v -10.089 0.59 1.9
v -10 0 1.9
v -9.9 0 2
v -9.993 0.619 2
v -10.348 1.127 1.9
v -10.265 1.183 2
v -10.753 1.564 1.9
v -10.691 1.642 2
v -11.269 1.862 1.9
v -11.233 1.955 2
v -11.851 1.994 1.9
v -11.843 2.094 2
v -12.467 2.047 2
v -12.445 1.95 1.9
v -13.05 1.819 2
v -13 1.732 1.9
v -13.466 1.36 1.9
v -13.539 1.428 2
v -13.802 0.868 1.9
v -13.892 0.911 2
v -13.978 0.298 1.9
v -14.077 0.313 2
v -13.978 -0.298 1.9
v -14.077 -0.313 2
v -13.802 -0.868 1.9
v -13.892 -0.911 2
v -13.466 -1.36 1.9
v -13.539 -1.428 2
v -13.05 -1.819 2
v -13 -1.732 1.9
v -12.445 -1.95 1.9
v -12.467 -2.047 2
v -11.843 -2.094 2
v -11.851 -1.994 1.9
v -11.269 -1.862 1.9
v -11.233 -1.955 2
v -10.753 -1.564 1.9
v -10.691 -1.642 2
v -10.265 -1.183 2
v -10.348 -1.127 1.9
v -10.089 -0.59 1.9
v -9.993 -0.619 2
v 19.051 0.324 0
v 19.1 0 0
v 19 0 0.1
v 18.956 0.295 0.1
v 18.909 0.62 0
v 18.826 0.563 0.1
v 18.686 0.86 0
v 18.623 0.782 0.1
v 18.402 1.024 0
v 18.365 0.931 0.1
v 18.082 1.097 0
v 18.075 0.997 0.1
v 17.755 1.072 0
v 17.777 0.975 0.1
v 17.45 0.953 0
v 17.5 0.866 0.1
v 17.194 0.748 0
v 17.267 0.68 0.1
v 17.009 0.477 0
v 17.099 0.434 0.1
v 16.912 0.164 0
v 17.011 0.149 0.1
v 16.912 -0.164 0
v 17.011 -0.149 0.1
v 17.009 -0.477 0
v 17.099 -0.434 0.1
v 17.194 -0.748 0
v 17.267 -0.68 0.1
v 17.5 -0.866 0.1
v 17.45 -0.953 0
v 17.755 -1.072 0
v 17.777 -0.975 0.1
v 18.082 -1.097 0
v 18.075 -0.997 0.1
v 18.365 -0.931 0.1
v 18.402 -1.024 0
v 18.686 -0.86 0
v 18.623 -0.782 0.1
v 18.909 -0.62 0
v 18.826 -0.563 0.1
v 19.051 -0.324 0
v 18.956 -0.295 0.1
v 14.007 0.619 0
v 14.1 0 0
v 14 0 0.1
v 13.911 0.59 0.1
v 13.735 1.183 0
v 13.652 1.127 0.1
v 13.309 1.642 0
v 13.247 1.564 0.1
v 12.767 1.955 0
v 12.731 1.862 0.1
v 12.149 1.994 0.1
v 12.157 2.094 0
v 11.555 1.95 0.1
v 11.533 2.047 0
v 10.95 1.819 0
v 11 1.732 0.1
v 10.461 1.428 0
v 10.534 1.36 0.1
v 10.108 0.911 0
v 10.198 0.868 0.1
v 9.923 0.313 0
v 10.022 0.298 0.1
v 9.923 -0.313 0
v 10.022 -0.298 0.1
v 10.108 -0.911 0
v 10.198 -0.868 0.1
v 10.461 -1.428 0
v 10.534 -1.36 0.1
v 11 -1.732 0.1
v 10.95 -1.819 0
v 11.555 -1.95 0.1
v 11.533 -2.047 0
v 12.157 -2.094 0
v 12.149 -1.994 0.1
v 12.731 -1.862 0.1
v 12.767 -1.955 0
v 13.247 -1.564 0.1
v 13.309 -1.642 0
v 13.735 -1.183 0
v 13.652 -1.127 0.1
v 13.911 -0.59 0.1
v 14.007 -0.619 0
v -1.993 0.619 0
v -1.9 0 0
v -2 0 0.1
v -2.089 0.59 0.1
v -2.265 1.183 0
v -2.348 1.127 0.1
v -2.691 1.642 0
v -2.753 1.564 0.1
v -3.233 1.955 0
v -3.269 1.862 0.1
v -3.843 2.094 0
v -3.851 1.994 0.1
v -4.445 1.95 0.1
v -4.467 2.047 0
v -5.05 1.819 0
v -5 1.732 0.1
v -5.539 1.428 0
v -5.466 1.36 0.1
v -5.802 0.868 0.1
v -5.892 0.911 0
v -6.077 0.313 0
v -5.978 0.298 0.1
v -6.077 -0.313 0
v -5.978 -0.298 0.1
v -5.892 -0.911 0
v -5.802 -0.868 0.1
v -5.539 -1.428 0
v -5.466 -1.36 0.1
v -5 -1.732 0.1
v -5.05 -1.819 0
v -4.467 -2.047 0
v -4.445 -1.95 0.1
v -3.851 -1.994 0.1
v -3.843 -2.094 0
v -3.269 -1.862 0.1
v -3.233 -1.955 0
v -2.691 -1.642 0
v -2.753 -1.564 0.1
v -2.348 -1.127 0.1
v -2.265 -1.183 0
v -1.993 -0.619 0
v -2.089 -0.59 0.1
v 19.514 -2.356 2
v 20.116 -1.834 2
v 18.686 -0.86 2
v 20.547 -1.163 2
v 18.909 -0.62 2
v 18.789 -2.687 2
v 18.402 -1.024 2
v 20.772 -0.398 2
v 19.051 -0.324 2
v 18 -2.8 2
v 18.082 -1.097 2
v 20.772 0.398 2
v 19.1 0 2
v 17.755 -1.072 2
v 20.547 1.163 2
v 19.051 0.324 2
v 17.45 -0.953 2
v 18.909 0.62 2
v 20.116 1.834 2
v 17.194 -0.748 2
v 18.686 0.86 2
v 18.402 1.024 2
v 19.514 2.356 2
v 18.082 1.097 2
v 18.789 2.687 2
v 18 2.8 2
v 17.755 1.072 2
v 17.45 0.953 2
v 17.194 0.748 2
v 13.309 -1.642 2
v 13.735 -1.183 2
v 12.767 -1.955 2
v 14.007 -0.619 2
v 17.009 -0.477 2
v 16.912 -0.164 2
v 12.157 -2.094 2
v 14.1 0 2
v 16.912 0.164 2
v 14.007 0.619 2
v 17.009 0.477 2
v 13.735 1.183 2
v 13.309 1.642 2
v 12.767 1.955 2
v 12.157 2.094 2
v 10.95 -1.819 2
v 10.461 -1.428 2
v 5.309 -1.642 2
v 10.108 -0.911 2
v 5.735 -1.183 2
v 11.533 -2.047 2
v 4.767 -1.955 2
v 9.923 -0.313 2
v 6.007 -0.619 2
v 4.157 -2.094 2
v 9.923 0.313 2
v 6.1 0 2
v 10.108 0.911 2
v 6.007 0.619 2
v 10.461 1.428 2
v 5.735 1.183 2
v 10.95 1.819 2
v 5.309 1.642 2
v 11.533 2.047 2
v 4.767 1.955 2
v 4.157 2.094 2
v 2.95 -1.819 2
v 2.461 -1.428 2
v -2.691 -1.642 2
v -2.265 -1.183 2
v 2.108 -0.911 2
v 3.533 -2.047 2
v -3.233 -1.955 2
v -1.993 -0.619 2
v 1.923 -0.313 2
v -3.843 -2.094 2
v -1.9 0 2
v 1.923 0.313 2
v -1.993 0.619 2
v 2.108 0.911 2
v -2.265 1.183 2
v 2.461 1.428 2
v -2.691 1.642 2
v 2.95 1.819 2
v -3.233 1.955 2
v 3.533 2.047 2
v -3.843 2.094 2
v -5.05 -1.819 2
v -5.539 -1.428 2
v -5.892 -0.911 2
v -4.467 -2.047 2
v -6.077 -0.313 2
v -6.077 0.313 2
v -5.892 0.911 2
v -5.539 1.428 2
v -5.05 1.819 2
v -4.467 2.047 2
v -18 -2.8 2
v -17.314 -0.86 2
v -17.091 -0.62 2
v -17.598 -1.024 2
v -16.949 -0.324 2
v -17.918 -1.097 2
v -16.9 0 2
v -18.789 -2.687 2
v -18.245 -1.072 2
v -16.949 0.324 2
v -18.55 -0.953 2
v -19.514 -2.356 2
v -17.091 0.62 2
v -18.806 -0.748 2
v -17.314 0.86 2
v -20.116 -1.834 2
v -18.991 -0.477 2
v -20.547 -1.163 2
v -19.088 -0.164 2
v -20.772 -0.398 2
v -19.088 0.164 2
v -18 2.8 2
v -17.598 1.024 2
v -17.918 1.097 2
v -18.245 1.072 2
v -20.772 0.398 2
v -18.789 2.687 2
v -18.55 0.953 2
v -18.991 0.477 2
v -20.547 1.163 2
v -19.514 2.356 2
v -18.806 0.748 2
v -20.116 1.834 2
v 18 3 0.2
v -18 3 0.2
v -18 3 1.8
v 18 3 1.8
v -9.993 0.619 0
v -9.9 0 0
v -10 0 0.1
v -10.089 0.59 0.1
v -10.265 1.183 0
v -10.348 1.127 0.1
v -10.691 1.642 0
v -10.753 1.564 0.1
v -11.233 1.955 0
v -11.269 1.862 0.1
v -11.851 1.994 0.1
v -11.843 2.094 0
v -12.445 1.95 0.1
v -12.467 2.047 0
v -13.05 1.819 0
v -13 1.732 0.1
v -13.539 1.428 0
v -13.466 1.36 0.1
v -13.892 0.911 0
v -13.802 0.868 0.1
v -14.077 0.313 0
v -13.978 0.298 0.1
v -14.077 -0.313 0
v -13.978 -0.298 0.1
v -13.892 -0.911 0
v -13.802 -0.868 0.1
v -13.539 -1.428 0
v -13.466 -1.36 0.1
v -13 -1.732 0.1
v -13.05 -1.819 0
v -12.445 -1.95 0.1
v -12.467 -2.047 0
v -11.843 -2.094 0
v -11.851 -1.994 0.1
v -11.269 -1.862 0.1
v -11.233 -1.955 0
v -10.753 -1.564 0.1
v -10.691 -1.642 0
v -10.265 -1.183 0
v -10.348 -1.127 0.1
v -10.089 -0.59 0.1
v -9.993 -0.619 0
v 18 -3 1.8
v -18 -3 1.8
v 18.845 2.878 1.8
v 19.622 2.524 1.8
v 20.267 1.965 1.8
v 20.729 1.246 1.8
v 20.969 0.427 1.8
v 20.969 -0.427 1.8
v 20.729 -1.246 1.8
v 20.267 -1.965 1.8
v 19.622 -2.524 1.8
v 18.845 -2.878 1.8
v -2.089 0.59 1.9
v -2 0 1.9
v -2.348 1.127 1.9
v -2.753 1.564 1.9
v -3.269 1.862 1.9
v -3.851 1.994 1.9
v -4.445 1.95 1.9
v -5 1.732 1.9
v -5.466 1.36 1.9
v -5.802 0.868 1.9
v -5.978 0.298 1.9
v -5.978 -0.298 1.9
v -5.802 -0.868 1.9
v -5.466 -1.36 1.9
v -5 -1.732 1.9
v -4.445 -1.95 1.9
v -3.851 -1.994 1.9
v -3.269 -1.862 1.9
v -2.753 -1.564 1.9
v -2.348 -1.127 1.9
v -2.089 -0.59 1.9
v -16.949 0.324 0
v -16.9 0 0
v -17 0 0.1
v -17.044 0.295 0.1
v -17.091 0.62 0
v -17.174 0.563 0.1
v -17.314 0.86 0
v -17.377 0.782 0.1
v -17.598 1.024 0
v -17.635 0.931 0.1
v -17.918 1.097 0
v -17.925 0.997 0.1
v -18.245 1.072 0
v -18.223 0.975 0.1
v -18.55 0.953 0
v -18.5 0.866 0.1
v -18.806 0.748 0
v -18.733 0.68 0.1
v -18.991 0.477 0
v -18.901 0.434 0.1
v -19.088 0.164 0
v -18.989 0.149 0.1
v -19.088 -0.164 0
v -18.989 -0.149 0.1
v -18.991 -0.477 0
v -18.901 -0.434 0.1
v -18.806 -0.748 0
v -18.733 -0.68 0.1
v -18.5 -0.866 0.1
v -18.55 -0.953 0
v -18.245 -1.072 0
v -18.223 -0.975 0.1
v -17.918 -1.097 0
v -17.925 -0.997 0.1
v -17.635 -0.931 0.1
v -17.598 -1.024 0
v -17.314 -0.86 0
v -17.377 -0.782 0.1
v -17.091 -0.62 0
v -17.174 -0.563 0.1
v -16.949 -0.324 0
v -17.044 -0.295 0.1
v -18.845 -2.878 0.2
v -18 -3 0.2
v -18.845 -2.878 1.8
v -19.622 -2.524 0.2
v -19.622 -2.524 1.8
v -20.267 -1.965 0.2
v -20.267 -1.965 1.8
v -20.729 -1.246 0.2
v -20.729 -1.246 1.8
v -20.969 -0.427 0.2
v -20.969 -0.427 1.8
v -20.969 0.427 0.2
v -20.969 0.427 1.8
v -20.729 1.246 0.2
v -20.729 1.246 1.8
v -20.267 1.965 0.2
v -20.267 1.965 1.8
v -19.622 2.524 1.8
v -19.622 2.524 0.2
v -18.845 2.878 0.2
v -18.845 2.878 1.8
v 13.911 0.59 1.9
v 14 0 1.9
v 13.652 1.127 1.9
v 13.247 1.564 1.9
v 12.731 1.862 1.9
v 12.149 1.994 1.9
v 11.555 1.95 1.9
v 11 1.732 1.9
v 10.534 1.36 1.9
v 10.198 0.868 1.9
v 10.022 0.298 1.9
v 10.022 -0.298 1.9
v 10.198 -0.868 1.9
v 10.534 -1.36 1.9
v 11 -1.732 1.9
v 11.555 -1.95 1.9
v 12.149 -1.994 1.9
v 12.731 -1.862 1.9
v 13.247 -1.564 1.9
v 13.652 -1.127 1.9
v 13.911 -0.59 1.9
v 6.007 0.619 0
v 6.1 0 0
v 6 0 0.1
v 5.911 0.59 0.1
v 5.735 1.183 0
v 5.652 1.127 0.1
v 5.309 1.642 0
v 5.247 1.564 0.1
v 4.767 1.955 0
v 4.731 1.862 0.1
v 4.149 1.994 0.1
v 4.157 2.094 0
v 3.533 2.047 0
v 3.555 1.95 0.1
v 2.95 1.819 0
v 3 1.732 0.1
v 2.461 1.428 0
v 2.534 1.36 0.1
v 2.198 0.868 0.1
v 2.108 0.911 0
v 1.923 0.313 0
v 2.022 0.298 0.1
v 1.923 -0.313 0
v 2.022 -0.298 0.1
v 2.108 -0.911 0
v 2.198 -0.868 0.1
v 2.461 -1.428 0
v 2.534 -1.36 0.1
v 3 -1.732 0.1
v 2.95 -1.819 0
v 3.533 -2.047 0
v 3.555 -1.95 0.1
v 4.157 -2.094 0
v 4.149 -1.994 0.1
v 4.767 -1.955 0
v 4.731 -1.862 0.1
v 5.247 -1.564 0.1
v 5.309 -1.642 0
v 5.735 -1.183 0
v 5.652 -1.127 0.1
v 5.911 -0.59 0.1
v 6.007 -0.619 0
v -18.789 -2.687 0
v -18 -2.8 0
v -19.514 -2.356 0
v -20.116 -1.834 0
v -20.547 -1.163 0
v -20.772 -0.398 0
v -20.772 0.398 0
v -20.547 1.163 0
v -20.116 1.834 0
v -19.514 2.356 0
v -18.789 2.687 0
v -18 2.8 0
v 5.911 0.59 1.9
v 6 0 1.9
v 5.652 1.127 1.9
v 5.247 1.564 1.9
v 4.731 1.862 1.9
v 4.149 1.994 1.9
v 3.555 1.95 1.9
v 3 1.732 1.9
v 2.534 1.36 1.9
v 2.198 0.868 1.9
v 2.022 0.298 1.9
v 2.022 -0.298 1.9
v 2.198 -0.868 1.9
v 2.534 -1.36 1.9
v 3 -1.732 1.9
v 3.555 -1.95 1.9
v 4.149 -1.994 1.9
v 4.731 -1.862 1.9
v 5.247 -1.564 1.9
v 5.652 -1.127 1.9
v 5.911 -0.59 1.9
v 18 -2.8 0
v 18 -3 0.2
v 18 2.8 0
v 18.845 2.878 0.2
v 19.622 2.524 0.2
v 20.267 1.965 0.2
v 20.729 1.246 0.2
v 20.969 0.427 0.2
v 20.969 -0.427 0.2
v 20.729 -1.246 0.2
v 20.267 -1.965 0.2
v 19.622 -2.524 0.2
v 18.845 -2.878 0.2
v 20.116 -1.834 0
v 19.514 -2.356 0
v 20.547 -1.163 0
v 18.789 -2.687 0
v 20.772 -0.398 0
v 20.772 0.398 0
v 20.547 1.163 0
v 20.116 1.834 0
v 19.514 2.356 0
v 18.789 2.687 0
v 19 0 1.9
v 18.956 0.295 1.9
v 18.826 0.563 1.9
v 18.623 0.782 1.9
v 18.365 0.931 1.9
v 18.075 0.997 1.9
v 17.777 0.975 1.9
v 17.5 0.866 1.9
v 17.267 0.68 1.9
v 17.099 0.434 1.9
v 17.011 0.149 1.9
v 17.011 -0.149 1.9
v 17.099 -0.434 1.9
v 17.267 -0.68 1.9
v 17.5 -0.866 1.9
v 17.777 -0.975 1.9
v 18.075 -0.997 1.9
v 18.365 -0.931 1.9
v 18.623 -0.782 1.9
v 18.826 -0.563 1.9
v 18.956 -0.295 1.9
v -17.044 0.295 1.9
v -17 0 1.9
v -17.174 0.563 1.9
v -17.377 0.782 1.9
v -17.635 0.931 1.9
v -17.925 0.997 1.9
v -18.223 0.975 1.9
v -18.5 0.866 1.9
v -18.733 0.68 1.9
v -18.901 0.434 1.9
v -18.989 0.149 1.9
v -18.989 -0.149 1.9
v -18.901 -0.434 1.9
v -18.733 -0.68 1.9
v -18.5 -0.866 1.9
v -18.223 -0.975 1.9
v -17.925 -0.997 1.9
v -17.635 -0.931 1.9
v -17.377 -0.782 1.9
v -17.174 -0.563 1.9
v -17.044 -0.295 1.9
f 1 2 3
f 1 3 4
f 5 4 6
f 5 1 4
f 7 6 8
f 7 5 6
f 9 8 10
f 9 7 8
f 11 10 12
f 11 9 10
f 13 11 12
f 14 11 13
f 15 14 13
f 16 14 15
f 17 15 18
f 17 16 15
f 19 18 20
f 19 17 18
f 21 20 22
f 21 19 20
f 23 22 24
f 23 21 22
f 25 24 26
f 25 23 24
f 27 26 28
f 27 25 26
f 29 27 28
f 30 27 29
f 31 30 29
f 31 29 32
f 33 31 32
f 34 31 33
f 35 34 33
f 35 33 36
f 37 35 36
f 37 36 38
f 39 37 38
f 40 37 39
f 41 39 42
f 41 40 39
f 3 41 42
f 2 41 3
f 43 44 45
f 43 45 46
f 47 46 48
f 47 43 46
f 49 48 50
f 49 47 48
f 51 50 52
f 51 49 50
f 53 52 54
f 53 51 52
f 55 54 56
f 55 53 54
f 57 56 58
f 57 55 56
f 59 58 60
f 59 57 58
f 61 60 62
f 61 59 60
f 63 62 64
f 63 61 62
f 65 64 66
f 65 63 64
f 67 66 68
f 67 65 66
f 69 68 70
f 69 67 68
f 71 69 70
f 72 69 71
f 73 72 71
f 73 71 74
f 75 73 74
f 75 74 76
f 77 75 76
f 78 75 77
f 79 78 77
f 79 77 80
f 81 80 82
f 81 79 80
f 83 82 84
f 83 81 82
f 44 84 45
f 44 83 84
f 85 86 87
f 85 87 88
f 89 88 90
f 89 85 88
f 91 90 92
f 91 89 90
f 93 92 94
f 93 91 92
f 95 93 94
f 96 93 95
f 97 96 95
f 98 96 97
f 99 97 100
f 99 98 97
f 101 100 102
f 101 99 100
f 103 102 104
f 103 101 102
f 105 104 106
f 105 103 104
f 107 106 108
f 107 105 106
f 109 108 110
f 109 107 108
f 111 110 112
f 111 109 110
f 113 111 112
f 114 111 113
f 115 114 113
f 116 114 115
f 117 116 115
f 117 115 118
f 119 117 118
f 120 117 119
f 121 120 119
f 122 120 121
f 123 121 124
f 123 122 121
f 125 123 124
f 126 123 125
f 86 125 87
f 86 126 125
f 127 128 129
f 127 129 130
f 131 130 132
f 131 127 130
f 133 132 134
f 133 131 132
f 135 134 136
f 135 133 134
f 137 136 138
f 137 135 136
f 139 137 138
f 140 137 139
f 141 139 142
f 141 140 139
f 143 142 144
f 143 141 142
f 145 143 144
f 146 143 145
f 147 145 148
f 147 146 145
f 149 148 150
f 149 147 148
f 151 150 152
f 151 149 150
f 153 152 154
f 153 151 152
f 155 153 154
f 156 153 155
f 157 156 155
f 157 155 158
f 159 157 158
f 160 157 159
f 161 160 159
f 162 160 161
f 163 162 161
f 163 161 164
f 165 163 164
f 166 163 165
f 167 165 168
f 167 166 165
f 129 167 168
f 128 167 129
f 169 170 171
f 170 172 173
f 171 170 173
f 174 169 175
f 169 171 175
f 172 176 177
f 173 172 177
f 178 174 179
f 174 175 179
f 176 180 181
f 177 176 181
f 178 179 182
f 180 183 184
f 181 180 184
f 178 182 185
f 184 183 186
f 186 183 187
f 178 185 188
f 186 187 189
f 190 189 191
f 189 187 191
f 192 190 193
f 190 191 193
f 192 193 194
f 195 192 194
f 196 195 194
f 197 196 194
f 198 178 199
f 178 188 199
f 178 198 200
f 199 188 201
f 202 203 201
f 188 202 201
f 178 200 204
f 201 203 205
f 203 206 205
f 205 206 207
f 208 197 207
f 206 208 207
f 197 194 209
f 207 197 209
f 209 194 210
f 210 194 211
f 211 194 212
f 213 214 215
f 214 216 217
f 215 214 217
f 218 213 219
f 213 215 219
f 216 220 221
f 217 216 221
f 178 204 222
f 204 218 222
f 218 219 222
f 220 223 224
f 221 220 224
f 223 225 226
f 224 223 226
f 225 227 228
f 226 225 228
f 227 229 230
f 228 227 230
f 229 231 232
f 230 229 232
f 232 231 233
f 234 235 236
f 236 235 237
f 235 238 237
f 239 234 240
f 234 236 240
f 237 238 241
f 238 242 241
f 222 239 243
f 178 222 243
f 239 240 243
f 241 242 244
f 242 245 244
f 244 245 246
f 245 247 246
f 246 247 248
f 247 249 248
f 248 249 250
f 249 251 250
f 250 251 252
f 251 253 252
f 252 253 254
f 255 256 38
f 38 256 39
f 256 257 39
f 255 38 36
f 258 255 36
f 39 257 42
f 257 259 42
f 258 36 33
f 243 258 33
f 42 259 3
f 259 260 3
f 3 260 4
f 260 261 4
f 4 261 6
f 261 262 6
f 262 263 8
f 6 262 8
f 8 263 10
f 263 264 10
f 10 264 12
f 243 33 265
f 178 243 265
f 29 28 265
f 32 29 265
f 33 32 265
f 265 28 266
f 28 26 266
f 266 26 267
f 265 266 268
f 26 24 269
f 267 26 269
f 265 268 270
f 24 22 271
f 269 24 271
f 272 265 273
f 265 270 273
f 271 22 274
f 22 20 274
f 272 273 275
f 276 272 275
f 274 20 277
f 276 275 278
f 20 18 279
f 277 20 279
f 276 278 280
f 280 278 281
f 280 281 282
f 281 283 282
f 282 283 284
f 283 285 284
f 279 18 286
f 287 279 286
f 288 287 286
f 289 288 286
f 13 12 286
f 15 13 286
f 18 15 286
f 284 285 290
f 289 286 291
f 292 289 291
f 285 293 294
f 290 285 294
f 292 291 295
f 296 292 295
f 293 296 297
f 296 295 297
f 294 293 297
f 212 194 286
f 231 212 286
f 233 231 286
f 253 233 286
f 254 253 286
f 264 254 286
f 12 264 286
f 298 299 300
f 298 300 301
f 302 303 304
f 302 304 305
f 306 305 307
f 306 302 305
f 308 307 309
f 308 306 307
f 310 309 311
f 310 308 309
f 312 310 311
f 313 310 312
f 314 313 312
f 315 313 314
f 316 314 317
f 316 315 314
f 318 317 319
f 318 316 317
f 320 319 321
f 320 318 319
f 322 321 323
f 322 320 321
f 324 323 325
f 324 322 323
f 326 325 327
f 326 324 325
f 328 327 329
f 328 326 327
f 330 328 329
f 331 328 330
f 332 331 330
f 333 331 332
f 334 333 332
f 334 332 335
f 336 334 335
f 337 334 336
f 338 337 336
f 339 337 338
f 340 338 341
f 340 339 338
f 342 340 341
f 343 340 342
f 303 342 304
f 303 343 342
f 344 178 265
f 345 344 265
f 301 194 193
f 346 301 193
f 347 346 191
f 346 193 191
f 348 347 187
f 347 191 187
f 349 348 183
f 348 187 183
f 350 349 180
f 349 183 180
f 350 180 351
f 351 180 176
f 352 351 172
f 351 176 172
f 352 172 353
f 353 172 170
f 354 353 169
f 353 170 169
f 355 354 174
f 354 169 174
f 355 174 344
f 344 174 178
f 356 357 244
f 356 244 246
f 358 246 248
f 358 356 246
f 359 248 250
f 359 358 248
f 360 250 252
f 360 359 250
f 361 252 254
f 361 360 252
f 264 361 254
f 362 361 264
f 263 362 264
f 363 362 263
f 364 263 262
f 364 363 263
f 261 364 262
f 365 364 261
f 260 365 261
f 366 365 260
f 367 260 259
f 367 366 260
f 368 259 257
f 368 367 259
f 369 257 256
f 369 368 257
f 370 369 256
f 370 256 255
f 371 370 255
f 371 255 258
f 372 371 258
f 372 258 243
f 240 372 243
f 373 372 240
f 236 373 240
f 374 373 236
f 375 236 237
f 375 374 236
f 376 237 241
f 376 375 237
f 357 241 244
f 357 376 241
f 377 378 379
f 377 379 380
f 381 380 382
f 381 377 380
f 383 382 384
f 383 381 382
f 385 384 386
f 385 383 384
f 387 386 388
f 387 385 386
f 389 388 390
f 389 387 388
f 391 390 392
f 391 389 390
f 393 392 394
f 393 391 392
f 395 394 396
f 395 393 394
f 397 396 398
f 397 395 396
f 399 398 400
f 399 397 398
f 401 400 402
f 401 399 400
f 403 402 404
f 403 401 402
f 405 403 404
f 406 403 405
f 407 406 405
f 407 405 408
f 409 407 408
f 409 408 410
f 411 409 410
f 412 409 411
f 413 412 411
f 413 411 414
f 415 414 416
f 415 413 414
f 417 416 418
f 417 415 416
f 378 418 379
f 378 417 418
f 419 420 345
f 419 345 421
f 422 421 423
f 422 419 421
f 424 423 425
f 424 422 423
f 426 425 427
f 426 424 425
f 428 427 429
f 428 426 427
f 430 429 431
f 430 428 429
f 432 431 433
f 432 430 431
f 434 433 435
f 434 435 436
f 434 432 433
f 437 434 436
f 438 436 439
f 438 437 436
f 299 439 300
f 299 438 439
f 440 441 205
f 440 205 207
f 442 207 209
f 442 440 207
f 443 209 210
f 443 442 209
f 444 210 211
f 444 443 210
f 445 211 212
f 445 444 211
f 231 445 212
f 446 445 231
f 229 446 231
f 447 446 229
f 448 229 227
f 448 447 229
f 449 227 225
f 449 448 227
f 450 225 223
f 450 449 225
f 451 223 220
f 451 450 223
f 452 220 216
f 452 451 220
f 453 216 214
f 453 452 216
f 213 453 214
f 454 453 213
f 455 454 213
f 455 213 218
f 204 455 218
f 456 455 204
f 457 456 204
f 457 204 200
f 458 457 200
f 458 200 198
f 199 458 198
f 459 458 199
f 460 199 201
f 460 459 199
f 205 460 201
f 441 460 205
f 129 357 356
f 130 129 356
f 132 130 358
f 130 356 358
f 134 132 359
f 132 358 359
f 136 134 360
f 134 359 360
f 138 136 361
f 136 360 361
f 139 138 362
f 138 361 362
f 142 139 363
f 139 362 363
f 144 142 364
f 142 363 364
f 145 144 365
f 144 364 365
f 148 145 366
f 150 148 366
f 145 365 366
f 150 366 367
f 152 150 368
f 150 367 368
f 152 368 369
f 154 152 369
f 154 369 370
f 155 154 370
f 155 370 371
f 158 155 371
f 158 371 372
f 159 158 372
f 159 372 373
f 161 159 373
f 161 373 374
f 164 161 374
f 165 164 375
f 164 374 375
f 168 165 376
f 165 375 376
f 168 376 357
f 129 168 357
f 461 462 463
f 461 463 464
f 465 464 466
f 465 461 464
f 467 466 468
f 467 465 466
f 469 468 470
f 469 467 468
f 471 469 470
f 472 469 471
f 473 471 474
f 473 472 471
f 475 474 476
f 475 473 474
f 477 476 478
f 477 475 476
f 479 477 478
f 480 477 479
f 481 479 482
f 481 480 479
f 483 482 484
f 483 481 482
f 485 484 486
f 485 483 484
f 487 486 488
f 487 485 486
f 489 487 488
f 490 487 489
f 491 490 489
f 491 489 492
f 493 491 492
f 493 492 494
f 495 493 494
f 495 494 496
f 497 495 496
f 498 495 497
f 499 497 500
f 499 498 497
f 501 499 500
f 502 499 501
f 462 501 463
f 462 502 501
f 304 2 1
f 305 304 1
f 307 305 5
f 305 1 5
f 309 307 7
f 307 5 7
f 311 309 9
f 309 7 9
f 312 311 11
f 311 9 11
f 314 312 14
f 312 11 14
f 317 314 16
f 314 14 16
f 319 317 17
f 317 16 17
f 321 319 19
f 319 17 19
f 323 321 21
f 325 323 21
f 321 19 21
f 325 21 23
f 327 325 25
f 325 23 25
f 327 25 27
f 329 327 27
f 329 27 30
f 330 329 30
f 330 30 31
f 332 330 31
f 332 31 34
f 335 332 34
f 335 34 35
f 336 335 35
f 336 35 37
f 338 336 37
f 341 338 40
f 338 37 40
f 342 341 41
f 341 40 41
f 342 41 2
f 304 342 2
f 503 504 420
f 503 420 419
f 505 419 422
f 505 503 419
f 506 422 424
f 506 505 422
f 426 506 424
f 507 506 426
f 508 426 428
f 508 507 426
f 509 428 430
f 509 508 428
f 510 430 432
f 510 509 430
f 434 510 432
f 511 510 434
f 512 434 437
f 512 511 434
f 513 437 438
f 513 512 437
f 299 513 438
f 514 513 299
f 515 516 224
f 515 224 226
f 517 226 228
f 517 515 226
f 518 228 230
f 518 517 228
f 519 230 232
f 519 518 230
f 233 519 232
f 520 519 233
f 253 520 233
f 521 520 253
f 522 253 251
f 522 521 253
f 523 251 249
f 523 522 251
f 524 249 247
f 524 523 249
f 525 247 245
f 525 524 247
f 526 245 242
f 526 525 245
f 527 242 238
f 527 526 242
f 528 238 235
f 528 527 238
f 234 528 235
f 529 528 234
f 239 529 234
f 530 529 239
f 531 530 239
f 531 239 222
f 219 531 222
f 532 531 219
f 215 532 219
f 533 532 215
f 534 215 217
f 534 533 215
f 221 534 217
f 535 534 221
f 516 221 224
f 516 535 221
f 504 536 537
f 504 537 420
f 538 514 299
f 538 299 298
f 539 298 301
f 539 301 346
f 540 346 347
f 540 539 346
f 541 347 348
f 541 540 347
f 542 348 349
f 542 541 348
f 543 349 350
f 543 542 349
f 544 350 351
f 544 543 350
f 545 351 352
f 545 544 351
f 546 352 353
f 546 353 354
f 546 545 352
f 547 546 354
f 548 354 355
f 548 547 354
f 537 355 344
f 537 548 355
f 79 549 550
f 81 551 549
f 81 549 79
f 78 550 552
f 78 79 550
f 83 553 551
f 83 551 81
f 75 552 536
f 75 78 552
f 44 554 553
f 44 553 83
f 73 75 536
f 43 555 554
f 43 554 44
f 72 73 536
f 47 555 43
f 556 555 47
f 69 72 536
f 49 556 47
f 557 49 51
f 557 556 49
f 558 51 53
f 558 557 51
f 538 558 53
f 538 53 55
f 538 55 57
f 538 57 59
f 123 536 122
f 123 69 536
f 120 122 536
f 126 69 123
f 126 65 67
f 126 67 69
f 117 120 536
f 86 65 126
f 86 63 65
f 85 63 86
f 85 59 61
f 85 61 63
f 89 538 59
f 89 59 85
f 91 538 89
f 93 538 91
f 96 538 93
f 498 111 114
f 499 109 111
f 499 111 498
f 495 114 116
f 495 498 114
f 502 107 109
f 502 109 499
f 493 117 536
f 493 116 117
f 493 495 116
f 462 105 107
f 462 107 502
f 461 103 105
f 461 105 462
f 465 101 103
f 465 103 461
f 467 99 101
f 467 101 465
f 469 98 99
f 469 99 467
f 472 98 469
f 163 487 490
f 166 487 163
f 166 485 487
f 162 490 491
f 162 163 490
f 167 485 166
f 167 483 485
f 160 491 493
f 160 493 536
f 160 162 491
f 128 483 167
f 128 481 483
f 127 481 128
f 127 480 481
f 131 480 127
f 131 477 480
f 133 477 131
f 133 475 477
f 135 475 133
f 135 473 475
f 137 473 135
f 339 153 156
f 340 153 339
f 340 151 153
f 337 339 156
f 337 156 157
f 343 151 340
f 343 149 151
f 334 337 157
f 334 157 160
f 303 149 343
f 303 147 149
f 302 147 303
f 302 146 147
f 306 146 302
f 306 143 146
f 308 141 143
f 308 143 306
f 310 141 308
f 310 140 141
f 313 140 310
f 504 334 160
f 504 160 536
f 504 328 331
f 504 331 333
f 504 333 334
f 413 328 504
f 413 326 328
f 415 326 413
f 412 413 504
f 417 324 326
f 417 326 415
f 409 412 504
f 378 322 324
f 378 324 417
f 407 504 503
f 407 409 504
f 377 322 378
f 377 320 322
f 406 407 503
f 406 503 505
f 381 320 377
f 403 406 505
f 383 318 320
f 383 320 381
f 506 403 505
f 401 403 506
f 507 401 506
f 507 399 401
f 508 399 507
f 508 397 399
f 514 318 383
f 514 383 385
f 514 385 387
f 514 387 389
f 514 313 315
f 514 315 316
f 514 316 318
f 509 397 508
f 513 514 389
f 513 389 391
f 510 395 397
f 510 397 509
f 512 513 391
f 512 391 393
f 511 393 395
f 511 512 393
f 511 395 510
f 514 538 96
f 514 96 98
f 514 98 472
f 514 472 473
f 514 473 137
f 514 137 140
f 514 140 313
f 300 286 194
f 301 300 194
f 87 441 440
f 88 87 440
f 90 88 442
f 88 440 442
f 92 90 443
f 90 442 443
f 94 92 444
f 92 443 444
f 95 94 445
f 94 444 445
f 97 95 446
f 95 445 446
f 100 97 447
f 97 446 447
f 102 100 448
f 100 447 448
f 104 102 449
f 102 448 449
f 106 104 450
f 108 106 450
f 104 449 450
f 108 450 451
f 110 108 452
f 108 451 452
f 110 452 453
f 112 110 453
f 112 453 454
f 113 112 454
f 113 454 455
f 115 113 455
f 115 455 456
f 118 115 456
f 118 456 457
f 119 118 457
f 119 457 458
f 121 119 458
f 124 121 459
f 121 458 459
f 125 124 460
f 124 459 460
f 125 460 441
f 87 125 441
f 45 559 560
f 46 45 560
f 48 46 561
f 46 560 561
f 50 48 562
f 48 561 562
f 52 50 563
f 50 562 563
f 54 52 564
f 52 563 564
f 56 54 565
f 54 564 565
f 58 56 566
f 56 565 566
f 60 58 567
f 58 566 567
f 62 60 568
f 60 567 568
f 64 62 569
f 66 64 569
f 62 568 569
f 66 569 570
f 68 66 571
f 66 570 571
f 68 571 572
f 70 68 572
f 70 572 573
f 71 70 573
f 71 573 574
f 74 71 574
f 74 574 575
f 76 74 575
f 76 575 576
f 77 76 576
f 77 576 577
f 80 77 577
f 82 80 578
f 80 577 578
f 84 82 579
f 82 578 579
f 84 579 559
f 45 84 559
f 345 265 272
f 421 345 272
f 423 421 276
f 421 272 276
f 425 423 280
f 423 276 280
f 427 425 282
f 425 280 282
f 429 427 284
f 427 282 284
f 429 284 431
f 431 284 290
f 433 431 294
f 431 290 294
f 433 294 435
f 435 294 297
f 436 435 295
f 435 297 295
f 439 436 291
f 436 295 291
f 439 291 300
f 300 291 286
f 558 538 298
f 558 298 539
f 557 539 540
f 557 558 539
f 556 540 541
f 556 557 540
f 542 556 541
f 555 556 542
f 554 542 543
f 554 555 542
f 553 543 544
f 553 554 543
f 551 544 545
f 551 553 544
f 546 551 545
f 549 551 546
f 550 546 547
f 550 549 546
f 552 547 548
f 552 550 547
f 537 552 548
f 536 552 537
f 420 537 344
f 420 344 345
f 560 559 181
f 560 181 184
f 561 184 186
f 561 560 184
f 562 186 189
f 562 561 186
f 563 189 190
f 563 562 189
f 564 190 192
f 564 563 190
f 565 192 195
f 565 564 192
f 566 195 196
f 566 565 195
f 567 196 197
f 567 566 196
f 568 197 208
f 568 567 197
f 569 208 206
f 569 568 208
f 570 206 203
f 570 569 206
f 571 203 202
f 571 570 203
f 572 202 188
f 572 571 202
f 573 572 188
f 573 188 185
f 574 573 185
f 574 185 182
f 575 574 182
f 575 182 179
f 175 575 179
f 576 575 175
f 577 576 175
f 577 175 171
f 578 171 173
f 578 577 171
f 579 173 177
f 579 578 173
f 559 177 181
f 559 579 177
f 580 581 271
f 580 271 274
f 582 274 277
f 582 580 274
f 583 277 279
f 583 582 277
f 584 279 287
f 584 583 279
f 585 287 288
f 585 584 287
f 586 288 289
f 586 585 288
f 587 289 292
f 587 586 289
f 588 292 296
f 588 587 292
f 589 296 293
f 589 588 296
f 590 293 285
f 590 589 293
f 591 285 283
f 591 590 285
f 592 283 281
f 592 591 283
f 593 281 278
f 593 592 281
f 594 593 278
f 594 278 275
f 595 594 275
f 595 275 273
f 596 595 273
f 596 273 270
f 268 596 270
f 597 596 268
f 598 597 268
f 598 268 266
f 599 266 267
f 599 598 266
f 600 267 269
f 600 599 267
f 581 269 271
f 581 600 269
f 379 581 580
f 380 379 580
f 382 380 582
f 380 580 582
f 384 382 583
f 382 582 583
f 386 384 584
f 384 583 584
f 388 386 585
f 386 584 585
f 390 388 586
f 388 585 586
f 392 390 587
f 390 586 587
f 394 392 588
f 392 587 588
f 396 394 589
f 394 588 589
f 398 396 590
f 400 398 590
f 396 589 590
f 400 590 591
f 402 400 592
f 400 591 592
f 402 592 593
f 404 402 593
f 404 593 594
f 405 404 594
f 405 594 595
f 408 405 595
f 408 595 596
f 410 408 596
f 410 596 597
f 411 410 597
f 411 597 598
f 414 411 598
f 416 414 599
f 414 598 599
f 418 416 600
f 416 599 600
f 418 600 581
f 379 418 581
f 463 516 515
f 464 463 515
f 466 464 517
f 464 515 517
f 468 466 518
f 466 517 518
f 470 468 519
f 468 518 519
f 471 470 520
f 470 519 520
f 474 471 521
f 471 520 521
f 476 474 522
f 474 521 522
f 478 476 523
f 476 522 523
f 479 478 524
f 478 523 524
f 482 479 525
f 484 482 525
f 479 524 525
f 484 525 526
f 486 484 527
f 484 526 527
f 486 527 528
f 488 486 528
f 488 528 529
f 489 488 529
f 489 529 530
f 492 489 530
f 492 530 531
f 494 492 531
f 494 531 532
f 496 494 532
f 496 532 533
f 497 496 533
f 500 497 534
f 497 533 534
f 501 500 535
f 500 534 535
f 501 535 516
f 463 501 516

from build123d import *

# Parameters (mm, degrees)
BOSS_EXTRUDE1_DEPTH = 2
CHAMFER3_SIZE       = 0.2
SKETCH4_R           = 1
SKETCH4_R_2         = 2
CUT_EXTRUDE3_DEPTH  = 2
CHAMFER5_SIZE       = 0.1
CHAMFER6_SIZE       = 0.1


with BuildPart() as part:
    # Sketch1 → Boss-Extrude1 (new body)
    with BuildSketch(Plane.XY):
        with BuildLine():
            Line((-18, 3), (18, 3))
            ThreePointArc((18, 3), (21, 0), (18, -3))
            Line((18, -3), (-18, -3))
            ThreePointArc((-18, -3), (-21, 0), (-18, 3))
        make_face()
    extrude(amount=BOSS_EXTRUDE1_DEPTH)

    # Chamfer3
    chamfer3_edges = [part.edges().sort_by_distance(p)[0] for p in [
        (21, 0, 2),
        (0, 3, 2),
        (-21, 0, 2),
        (0, 3, 0),
        (21, 0, 0),
        (0, -3, 0),
        (-21, 0, 0),
        (0, -3, 2),
    ]]
    chamfer(chamfer3_edges, length=CHAMFER3_SIZE)

    # Sketch4 → Cut-Extrude3 (cut)
    with BuildSketch(Plane.XY.offset(2)):
        with Locations((-18, 0)):
            Circle(SKETCH4_R)
        with Locations((-12, 0)):
            Circle(SKETCH4_R_2)
        with Locations((-4, 0)):
            Circle(SKETCH4_R_2)
        with Locations((4, 0)):
            Circle(SKETCH4_R_2)
        with Locations((12, 0)):
            Circle(SKETCH4_R_2)
        with Locations((18, 0)):
            Circle(SKETCH4_R)
    extrude(amount=-CUT_EXTRUDE3_DEPTH, mode=Mode.SUBTRACT)

    # Chamfer5
    chamfer5_edges = [part.edges().sort_by_distance(p)[0] for p in [
        (-19, 0, 2),
        (-6, 0, 2),
        (-14, 0, 2),
        (2, 0, 2),
        (10, 0, 2),
        (17, 0, 2),
    ]]
    chamfer(chamfer5_edges, length=CHAMFER5_SIZE)

    # Chamfer6
    chamfer6_edges = [part.edges().sort_by_distance(p)[0] for p in [
        (-19, 0, 0),
        (-6, 0, 0),
        (-14, 0, 0),
        (2, 0, 0),
        (10, 0, 0),
        (17, 0, 0),
    ]]
    chamfer(chamfer6_edges, length=CHAMFER6_SIZE)


solid = part.part
